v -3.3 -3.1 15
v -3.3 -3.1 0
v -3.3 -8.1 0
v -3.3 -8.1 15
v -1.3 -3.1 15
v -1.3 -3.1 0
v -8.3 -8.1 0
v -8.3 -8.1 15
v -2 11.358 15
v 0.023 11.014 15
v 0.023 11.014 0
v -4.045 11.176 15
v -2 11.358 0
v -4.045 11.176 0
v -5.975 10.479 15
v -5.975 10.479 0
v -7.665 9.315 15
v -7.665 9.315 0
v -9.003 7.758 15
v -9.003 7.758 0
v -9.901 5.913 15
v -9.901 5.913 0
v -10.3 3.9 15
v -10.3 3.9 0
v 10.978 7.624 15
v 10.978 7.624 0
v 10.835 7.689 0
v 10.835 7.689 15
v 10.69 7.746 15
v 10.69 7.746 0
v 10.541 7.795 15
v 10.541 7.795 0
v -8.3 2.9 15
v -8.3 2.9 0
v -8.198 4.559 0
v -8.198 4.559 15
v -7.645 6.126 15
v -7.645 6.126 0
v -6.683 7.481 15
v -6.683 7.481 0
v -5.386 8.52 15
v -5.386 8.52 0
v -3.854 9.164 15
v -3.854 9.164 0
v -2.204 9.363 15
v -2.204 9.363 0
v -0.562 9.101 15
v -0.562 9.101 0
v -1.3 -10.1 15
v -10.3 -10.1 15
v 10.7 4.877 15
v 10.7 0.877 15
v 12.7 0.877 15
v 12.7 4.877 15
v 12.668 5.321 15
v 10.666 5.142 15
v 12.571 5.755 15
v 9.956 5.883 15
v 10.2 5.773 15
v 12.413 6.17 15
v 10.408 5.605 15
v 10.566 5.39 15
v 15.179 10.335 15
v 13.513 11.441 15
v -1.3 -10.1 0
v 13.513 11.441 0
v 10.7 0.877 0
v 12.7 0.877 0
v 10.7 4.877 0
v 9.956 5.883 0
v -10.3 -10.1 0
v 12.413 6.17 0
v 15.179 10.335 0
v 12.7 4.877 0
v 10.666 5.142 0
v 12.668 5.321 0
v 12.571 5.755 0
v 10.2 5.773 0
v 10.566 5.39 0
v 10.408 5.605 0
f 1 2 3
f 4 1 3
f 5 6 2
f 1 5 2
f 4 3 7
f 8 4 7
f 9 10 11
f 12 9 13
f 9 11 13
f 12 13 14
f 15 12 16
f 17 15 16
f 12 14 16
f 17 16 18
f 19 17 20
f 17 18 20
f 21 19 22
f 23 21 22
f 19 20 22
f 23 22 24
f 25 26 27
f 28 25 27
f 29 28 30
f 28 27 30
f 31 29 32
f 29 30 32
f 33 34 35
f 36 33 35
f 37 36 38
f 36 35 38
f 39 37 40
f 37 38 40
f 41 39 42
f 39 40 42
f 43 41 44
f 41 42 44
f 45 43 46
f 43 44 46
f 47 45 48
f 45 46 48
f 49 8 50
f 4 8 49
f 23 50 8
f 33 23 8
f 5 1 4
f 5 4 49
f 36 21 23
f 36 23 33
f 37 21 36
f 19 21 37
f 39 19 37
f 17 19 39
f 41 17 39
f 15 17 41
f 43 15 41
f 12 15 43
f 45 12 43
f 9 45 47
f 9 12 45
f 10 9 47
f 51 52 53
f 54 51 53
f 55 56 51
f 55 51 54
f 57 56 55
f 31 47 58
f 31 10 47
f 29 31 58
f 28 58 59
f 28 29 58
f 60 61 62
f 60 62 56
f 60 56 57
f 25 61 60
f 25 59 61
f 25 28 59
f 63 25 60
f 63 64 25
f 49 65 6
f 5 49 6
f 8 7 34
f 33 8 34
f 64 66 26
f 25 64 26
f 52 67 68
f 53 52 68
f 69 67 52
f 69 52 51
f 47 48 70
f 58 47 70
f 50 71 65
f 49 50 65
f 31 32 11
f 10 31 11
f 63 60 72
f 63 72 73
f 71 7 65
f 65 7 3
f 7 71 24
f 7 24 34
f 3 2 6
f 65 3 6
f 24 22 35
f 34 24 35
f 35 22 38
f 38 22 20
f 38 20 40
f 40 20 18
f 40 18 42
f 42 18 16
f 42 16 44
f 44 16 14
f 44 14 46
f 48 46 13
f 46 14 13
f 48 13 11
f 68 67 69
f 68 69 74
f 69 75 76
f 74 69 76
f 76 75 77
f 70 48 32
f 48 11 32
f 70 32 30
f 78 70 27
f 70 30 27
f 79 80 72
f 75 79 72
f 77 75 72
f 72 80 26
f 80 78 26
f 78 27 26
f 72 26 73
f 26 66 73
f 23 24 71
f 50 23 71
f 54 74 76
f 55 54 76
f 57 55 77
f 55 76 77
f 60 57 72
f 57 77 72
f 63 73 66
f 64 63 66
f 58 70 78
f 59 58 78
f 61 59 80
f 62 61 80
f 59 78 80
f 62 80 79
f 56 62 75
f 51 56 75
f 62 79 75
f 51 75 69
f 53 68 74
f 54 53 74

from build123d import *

# Parameters (mm, degrees)
F0_W     = 2
F0_H     = 4
F1_DEPTH = 15
F2_W     = 2
F2_H     = 4
F3_DEPTH = 15


# Not quite as in the source:
# - a feature names something its author has since deleted; it is built from what else it names


with BuildPart() as f1:
    # F0 (on Top) → F1 (new body)
    with BuildSketch(Plane.XY):
        with BuildLine():
            Line((7, 32.0000030547), (2, 32.0000030547))
            Line((2, 32.0000030547), (2, 43.0000030547))
            ThreePointArc((2, 43.0000030547), (4.22965477, 48.1459058579), (9.7375987459, 49.20147642))
            Line((9.7375987459, 49.20147642), (10.3227891625, 51.113949211))
            ThreePointArc((10.3227891625, 51.113949211), (3.4424209582, 50.0513163902), (0, 44.0000030547))
            Line((0, 44.0000030547), (0, 30.0000030547))
            Line((0, 30.0000030547), (9, 30.0000030547))
            Line((9, 30.0000030547), (9, 37.0000030547))
            Line((9, 37.0000030547), (7, 37.0000030547))
            Line((7, 37.0000030547), (7, 32.0000030547))
        make_face()
        Polygon((10.3227891625, 51.113949211), (9.7375987459, 49.20147642), (20.2561990964, 45.9829291287), (20.841389513, 47.8954019197), align=None)
        with BuildLine():
            Line((20.841389513, 47.8954019197), (20.2561990964, 45.9829291287))
            ThreePointArc((20.2561990964, 45.9829291287), (20.7938383415, 45.6028219427), (21, 44.9774941877))
            Line((21, 44.9774941877), (23, 44.9774941877))
            ThreePointArc((23, 44.9774941877), (22.9273260191, 45.6394915882), (22.7127657141, 46.2699564496))
            ThreePointArc((22.7127657141, 46.2699564496), (22.1205825647, 47.1207678466), (21.277739528, 47.7242382529))
            ThreePointArc((21.277739528, 47.7242382529), (21.0628558439, 47.8182107047), (20.841389513, 47.8954019197))
        make_face()
        with Locations((22, 42.9774941877)):
            Rectangle(F0_W, F0_H)
        with BuildLine():
            Line((23.8132360697, 51.5414804224), (21.277739528, 47.7242382529))
            ThreePointArc((21.277739528, 47.7242382529), (22.1205825647, 47.1207678466), (22.7127657141, 46.2699564496))
            Line((22.7127657141, 46.2699564496), (25.4792139424, 50.4349011311))
            Line((25.4792139424, 50.4349011311), (23.8132360697, 51.5414804224))
        make_face()
    extrude(amount=F1_DEPTH)


with BuildPart() as f3:
    # F2 (on Top) → F3 (new body)
    with BuildSketch(Plane.XY):
        with Locations((-37.8, -36.9225088671)):
            Rectangle(F2_W, F2_H)
        with BuildLine():
            ThreePointArc((-39.5438009036, -33.9170739261), (-39.0061616585, -34.2971811121), (-38.8, -34.9225088671))
            Line((-38.8, -34.9225088671), (-36.8, -34.9225088671))
            ThreePointArc((-36.8, -34.9225088671), (-36.8726739809, -34.2605114665), (-37.0872342859, -33.6300466052))
            ThreePointArc((-37.0872342859, -33.6300466052), (-37.6794174353, -32.7792352081), (-38.522260472, -32.1757648018))
            ThreePointArc((-38.522260472, -32.1757648018), (-38.7371441561, -32.0817923501), (-38.958610487, -32.0046011351))
            Line((-38.958610487, -32.0046011351), (-39.5438009036, -33.9170739261))
        make_face()
        Polygon((-50.0624012541, -30.6985266348), (-39.5438009036, -33.9170739261), (-38.958610487, -32.0046011351), (-49.4772108375, -28.7860538438), align=None)
        with BuildLine():
            ThreePointArc((-57.8, -36.9), (-55.57034523, -31.7540971969), (-50.0624012541, -30.6985266348))
            Line((-50.0624012541, -30.6985266348), (-49.4772108375, -28.7860538438))
            ThreePointArc((-49.4772108375, -28.7860538438), (-56.3575790418, -29.8486866645), (-59.8, -35.9))
            Line((-59.8, -35.9), (-59.8, -49.9))
            Line((-59.8, -49.9), (-50.8, -49.9))
            Line((-50.8, -49.9), (-50.8, -42.9))
            Line((-50.8, -42.9), (-52.8, -42.9))
            Line((-52.8, -42.9), (-52.8, -47.9))
            Line((-52.8, -47.9), (-57.8, -47.9))
            Line((-57.8, -47.9), (-57.8, -36.9))
        make_face()
        with BuildLine():
            ThreePointArc((-38.522260472, -32.1757648018), (-37.6794174353, -32.7792352081), (-37.0872342859, -33.6300466052))
            Line((-37.0872342859, -33.6300466052), (-34.3207860576, -29.4651019236))
            Line((-34.3207860576, -29.4651019236), (-35.9867639303, -28.3585226323))
            Line((-35.9867639303, -28.3585226323), (-38.522260472, -32.1757648018))
        make_face()
    extrude(amount=F3_DEPTH)


with BuildPart() as f3b:
    # F2 (on Top) → F3, piece 2 (new body)
    with BuildSketch(Plane.XY):
        with Locations((33.034186706, 0.0025241677)):
            Rectangle(F2_W, F2_H)
        with BuildLine():
            ThreePointArc((31.2903858024, 3.0079591087), (31.8280250475, 2.6278519227), (32.034186706, 2.0025241677))
            Line((32.034186706, 2.0025241677), (34.034186706, 2.0025241677))
            ThreePointArc((34.034186706, 2.0025241677), (33.9615127251, 2.6645215683), (33.7469524201, 3.2949864296))
            ThreePointArc((33.7469524201, 3.2949864296), (33.1547692707, 4.1457978267), (32.311926234, 4.749268233))
            ThreePointArc((32.311926234, 4.749268233), (32.0970425499, 4.8432406847), (31.875576219, 4.9204318997))
            Line((31.875576219, 4.9204318997), (31.2903858024, 3.0079591087))
        make_face()
        Polygon((20.7717854519, 6.2265064), (31.2903858024, 3.0079591087), (31.875576219, 4.9204318997), (21.3569758685, 8.138979191), align=None)
        with BuildLine():
            ThreePointArc((13.034186706, 0.0250330348), (15.2638414761, 5.1709358379), (20.7717854519, 6.2265064))
            Line((20.7717854519, 6.2265064), (21.3569758685, 8.138979191))
            ThreePointArc((21.3569758685, 8.138979191), (14.4766076642, 7.0763463703), (11.034186706, 1.0250330348))
            Line((11.034186706, 1.0250330348), (11.034186706, -12.9749669652))
            Line((11.034186706, -12.9749669652), (20.034186706, -12.9749669652))
            Line((20.034186706, -12.9749669652), (20.034186706, -5.9749669652))
            Line((20.034186706, -5.9749669652), (18.034186706, -5.9749669652))
            Line((18.034186706, -5.9749669652), (18.034186706, -10.9749669652))
            Line((18.034186706, -10.9749669652), (13.034186706, -10.9749669652))
            Line((13.034186706, -10.9749669652), (13.034186706, 0.0250330348))
        make_face()
        with BuildLine():
            ThreePointArc((32.311926234, 4.749268233), (33.1547692707, 4.1457978267), (33.7469524201, 3.2949864296))
            Line((33.7469524201, 3.2949864296), (36.5134006484, 7.4599311112))
            Line((36.5134006484, 7.4599311112), (34.8474227758, 8.5665104025))
            Line((34.8474227758, 8.5665104025), (32.311926234, 4.749268233))
        make_face()
    extrude(amount=F3_DEPTH)


with BuildPart() as f3c:
    # F2 (on Top) → F3, piece 3 (new body)
    with BuildSketch(Plane.XY):
        with Locations((-12.8, -36.9225088671)):
            Rectangle(F2_W, F2_H)
        with BuildLine():
            ThreePointArc((-14.5438009036, -33.9170739261), (-14.0061616585, -34.2971811121), (-13.8, -34.9225088671))
            Line((-13.8, -34.9225088671), (-11.8, -34.9225088671))
            ThreePointArc((-11.8, -34.9225088671), (-11.8726739809, -34.2605114665), (-12.0872342859, -33.6300466052))
            ThreePointArc((-12.0872342859, -33.6300466052), (-12.6794174353, -32.7792352081), (-13.522260472, -32.1757648018))
            ThreePointArc((-13.522260472, -32.1757648018), (-13.7371441561, -32.0817923501), (-13.958610487, -32.0046011351))
            Line((-13.958610487, -32.0046011351), (-14.5438009036, -33.9170739261))
        make_face()
        Polygon((-25.0624012541, -30.6985266348), (-14.5438009036, -33.9170739261), (-13.958610487, -32.0046011351), (-24.4772108375, -28.7860538438), align=None)
        with BuildLine():
            ThreePointArc((-32.8, -36.9), (-30.57034523, -31.7540971969), (-25.0624012541, -30.6985266348))
            Line((-25.0624012541, -30.6985266348), (-24.4772108375, -28.7860538438))
            ThreePointArc((-24.4772108375, -28.7860538438), (-31.3575790418, -29.8486866645), (-34.8, -35.9))
            Line((-34.8, -35.9), (-34.8, -49.9))
            Line((-34.8, -49.9), (-25.8, -49.9))
            Line((-25.8, -49.9), (-25.8, -42.9))
            Line((-25.8, -42.9), (-27.8, -42.9))
            Line((-27.8, -42.9), (-27.8, -47.9))
            Line((-27.8, -47.9), (-32.8, -47.9))
            Line((-32.8, -47.9), (-32.8, -36.9))
        make_face()
        with BuildLine():
            ThreePointArc((-13.522260472, -32.1757648018), (-12.6794174353, -32.7792352081), (-12.0872342859, -33.6300466052))
            Line((-12.0872342859, -33.6300466052), (-9.3207860576, -29.4651019236))
            Line((-9.3207860576, -29.4651019236), (-10.9867639303, -28.3585226323))
            Line((-10.9867639303, -28.3585226323), (-13.522260472, -32.1757648018))
        make_face()
    extrude(amount=F3_DEPTH)


with BuildPart() as f3d:
    # F2 (on Top) → F3, piece 4 (new body)
    with BuildSketch(Plane.XY):
        with Locations((58.034186706, 0.0025241677)):
            Rectangle(F2_W, F2_H)
        with BuildLine():
            ThreePointArc((56.2903858024, 3.0079591087), (56.8280250475, 2.6278519227), (57.034186706, 2.0025241677))
            Line((57.034186706, 2.0025241677), (59.034186706, 2.0025241677))
            ThreePointArc((59.034186706, 2.0025241677), (58.9615127251, 2.6645215683), (58.7469524201, 3.2949864296))
            ThreePointArc((58.7469524201, 3.2949864296), (58.1547692707, 4.1457978267), (57.311926234, 4.749268233))
            ThreePointArc((57.311926234, 4.749268233), (57.0970425499, 4.8432406847), (56.875576219, 4.9204318997))
            Line((56.875576219, 4.9204318997), (56.2903858024, 3.0079591087))
        make_face()
        Polygon((45.7717854519, 6.2265064), (56.2903858024, 3.0079591087), (56.875576219, 4.9204318997), (46.3569758685, 8.138979191), align=None)
        with BuildLine():
            ThreePointArc((38.034186706, 0.0250330348), (40.2638414761, 5.1709358379), (45.7717854519, 6.2265064))
            Line((45.7717854519, 6.2265064), (46.3569758685, 8.138979191))
            ThreePointArc((46.3569758685, 8.138979191), (39.4766076642, 7.0763463703), (36.034186706, 1.0250330348))
            Line((36.034186706, 1.0250330348), (36.034186706, -12.9749669652))
            Line((36.034186706, -12.9749669652), (45.034186706, -12.9749669652))
            Line((45.034186706, -12.9749669652), (45.034186706, -5.9749669652))
            Line((45.034186706, -5.9749669652), (43.034186706, -5.9749669652))
            Line((43.034186706, -5.9749669652), (43.034186706, -10.9749669652))
            Line((43.034186706, -10.9749669652), (38.034186706, -10.9749669652))
            Line((38.034186706, -10.9749669652), (38.034186706, 0.0250330348))
        make_face()
        with BuildLine():
            ThreePointArc((57.311926234, 4.749268233), (58.1547692707, 4.1457978267), (58.7469524201, 3.2949864296))
            Line((58.7469524201, 3.2949864296), (61.5134006484, 7.4599311112))
            Line((61.5134006484, 7.4599311112), (59.8474227758, 8.5665104025))
            Line((59.8474227758, 8.5665104025), (57.311926234, 4.749268233))
        make_face()
    extrude(amount=F3_DEPTH)


with BuildPart() as f3e:
    # F2 (on Top) → F3, piece 5 (new body)
    with BuildSketch(Plane.XY):
        with Locations((12.2, -36.9225088671)):
            Rectangle(F2_W, F2_H)
        with BuildLine():
            ThreePointArc((10.4561990964, -33.9170739261), (10.9938383415, -34.2971811121), (11.2, -34.9225088671))
            Line((11.2, -34.9225088671), (13.2, -34.9225088671))
            ThreePointArc((13.2, -34.9225088671), (13.1273260191, -34.2605114665), (12.9127657141, -33.6300466052))
            ThreePointArc((12.9127657141, -33.6300466052), (12.3205825647, -32.7792352081), (11.477739528, -32.1757648018))
            ThreePointArc((11.477739528, -32.1757648018), (11.2628558439, -32.0817923501), (11.041389513, -32.0046011351))
            Line((11.041389513, -32.0046011351), (10.4561990964, -33.9170739261))
        make_face()
        Polygon((-0.0624012541, -30.6985266348), (10.4561990964, -33.9170739261), (11.041389513, -32.0046011351), (0.5227891625, -28.7860538438), align=None)
        with BuildLine():
            ThreePointArc((-7.8, -36.9), (-5.57034523, -31.7540971969), (-0.0624012541, -30.6985266348))
            Line((-0.0624012541, -30.6985266348), (0.5227891625, -28.7860538438))
            ThreePointArc((0.5227891625, -28.7860538438), (-6.3575790418, -29.8486866645), (-9.8, -35.9))
            Line((-9.8, -35.9), (-9.8, -49.9))
            Line((-9.8, -49.9), (-0.8, -49.9))
            Line((-0.8, -49.9), (-0.8, -42.9))
            Line((-0.8, -42.9), (-2.8, -42.9))
            Line((-2.8, -42.9), (-2.8, -47.9))
            Line((-2.8, -47.9), (-7.8, -47.9))
            Line((-7.8, -47.9), (-7.8, -36.9))
        make_face()
        with BuildLine():
            ThreePointArc((11.477739528, -32.1757648018), (12.3205825647, -32.7792352081), (12.9127657141, -33.6300466052))
            Line((12.9127657141, -33.6300466052), (15.6792139424, -29.4651019236))
            Line((15.6792139424, -29.4651019236), (14.0132360697, -28.3585226323))
            Line((14.0132360697, -28.3585226323), (11.477739528, -32.1757648018))
        make_face()
    extrude(amount=F3_DEPTH)


with BuildPart() as f1_1:
    # F5: moved
    add(f1.part.moved(Location((-10.3, -40.1, 0))))


solid = f1_1.part
